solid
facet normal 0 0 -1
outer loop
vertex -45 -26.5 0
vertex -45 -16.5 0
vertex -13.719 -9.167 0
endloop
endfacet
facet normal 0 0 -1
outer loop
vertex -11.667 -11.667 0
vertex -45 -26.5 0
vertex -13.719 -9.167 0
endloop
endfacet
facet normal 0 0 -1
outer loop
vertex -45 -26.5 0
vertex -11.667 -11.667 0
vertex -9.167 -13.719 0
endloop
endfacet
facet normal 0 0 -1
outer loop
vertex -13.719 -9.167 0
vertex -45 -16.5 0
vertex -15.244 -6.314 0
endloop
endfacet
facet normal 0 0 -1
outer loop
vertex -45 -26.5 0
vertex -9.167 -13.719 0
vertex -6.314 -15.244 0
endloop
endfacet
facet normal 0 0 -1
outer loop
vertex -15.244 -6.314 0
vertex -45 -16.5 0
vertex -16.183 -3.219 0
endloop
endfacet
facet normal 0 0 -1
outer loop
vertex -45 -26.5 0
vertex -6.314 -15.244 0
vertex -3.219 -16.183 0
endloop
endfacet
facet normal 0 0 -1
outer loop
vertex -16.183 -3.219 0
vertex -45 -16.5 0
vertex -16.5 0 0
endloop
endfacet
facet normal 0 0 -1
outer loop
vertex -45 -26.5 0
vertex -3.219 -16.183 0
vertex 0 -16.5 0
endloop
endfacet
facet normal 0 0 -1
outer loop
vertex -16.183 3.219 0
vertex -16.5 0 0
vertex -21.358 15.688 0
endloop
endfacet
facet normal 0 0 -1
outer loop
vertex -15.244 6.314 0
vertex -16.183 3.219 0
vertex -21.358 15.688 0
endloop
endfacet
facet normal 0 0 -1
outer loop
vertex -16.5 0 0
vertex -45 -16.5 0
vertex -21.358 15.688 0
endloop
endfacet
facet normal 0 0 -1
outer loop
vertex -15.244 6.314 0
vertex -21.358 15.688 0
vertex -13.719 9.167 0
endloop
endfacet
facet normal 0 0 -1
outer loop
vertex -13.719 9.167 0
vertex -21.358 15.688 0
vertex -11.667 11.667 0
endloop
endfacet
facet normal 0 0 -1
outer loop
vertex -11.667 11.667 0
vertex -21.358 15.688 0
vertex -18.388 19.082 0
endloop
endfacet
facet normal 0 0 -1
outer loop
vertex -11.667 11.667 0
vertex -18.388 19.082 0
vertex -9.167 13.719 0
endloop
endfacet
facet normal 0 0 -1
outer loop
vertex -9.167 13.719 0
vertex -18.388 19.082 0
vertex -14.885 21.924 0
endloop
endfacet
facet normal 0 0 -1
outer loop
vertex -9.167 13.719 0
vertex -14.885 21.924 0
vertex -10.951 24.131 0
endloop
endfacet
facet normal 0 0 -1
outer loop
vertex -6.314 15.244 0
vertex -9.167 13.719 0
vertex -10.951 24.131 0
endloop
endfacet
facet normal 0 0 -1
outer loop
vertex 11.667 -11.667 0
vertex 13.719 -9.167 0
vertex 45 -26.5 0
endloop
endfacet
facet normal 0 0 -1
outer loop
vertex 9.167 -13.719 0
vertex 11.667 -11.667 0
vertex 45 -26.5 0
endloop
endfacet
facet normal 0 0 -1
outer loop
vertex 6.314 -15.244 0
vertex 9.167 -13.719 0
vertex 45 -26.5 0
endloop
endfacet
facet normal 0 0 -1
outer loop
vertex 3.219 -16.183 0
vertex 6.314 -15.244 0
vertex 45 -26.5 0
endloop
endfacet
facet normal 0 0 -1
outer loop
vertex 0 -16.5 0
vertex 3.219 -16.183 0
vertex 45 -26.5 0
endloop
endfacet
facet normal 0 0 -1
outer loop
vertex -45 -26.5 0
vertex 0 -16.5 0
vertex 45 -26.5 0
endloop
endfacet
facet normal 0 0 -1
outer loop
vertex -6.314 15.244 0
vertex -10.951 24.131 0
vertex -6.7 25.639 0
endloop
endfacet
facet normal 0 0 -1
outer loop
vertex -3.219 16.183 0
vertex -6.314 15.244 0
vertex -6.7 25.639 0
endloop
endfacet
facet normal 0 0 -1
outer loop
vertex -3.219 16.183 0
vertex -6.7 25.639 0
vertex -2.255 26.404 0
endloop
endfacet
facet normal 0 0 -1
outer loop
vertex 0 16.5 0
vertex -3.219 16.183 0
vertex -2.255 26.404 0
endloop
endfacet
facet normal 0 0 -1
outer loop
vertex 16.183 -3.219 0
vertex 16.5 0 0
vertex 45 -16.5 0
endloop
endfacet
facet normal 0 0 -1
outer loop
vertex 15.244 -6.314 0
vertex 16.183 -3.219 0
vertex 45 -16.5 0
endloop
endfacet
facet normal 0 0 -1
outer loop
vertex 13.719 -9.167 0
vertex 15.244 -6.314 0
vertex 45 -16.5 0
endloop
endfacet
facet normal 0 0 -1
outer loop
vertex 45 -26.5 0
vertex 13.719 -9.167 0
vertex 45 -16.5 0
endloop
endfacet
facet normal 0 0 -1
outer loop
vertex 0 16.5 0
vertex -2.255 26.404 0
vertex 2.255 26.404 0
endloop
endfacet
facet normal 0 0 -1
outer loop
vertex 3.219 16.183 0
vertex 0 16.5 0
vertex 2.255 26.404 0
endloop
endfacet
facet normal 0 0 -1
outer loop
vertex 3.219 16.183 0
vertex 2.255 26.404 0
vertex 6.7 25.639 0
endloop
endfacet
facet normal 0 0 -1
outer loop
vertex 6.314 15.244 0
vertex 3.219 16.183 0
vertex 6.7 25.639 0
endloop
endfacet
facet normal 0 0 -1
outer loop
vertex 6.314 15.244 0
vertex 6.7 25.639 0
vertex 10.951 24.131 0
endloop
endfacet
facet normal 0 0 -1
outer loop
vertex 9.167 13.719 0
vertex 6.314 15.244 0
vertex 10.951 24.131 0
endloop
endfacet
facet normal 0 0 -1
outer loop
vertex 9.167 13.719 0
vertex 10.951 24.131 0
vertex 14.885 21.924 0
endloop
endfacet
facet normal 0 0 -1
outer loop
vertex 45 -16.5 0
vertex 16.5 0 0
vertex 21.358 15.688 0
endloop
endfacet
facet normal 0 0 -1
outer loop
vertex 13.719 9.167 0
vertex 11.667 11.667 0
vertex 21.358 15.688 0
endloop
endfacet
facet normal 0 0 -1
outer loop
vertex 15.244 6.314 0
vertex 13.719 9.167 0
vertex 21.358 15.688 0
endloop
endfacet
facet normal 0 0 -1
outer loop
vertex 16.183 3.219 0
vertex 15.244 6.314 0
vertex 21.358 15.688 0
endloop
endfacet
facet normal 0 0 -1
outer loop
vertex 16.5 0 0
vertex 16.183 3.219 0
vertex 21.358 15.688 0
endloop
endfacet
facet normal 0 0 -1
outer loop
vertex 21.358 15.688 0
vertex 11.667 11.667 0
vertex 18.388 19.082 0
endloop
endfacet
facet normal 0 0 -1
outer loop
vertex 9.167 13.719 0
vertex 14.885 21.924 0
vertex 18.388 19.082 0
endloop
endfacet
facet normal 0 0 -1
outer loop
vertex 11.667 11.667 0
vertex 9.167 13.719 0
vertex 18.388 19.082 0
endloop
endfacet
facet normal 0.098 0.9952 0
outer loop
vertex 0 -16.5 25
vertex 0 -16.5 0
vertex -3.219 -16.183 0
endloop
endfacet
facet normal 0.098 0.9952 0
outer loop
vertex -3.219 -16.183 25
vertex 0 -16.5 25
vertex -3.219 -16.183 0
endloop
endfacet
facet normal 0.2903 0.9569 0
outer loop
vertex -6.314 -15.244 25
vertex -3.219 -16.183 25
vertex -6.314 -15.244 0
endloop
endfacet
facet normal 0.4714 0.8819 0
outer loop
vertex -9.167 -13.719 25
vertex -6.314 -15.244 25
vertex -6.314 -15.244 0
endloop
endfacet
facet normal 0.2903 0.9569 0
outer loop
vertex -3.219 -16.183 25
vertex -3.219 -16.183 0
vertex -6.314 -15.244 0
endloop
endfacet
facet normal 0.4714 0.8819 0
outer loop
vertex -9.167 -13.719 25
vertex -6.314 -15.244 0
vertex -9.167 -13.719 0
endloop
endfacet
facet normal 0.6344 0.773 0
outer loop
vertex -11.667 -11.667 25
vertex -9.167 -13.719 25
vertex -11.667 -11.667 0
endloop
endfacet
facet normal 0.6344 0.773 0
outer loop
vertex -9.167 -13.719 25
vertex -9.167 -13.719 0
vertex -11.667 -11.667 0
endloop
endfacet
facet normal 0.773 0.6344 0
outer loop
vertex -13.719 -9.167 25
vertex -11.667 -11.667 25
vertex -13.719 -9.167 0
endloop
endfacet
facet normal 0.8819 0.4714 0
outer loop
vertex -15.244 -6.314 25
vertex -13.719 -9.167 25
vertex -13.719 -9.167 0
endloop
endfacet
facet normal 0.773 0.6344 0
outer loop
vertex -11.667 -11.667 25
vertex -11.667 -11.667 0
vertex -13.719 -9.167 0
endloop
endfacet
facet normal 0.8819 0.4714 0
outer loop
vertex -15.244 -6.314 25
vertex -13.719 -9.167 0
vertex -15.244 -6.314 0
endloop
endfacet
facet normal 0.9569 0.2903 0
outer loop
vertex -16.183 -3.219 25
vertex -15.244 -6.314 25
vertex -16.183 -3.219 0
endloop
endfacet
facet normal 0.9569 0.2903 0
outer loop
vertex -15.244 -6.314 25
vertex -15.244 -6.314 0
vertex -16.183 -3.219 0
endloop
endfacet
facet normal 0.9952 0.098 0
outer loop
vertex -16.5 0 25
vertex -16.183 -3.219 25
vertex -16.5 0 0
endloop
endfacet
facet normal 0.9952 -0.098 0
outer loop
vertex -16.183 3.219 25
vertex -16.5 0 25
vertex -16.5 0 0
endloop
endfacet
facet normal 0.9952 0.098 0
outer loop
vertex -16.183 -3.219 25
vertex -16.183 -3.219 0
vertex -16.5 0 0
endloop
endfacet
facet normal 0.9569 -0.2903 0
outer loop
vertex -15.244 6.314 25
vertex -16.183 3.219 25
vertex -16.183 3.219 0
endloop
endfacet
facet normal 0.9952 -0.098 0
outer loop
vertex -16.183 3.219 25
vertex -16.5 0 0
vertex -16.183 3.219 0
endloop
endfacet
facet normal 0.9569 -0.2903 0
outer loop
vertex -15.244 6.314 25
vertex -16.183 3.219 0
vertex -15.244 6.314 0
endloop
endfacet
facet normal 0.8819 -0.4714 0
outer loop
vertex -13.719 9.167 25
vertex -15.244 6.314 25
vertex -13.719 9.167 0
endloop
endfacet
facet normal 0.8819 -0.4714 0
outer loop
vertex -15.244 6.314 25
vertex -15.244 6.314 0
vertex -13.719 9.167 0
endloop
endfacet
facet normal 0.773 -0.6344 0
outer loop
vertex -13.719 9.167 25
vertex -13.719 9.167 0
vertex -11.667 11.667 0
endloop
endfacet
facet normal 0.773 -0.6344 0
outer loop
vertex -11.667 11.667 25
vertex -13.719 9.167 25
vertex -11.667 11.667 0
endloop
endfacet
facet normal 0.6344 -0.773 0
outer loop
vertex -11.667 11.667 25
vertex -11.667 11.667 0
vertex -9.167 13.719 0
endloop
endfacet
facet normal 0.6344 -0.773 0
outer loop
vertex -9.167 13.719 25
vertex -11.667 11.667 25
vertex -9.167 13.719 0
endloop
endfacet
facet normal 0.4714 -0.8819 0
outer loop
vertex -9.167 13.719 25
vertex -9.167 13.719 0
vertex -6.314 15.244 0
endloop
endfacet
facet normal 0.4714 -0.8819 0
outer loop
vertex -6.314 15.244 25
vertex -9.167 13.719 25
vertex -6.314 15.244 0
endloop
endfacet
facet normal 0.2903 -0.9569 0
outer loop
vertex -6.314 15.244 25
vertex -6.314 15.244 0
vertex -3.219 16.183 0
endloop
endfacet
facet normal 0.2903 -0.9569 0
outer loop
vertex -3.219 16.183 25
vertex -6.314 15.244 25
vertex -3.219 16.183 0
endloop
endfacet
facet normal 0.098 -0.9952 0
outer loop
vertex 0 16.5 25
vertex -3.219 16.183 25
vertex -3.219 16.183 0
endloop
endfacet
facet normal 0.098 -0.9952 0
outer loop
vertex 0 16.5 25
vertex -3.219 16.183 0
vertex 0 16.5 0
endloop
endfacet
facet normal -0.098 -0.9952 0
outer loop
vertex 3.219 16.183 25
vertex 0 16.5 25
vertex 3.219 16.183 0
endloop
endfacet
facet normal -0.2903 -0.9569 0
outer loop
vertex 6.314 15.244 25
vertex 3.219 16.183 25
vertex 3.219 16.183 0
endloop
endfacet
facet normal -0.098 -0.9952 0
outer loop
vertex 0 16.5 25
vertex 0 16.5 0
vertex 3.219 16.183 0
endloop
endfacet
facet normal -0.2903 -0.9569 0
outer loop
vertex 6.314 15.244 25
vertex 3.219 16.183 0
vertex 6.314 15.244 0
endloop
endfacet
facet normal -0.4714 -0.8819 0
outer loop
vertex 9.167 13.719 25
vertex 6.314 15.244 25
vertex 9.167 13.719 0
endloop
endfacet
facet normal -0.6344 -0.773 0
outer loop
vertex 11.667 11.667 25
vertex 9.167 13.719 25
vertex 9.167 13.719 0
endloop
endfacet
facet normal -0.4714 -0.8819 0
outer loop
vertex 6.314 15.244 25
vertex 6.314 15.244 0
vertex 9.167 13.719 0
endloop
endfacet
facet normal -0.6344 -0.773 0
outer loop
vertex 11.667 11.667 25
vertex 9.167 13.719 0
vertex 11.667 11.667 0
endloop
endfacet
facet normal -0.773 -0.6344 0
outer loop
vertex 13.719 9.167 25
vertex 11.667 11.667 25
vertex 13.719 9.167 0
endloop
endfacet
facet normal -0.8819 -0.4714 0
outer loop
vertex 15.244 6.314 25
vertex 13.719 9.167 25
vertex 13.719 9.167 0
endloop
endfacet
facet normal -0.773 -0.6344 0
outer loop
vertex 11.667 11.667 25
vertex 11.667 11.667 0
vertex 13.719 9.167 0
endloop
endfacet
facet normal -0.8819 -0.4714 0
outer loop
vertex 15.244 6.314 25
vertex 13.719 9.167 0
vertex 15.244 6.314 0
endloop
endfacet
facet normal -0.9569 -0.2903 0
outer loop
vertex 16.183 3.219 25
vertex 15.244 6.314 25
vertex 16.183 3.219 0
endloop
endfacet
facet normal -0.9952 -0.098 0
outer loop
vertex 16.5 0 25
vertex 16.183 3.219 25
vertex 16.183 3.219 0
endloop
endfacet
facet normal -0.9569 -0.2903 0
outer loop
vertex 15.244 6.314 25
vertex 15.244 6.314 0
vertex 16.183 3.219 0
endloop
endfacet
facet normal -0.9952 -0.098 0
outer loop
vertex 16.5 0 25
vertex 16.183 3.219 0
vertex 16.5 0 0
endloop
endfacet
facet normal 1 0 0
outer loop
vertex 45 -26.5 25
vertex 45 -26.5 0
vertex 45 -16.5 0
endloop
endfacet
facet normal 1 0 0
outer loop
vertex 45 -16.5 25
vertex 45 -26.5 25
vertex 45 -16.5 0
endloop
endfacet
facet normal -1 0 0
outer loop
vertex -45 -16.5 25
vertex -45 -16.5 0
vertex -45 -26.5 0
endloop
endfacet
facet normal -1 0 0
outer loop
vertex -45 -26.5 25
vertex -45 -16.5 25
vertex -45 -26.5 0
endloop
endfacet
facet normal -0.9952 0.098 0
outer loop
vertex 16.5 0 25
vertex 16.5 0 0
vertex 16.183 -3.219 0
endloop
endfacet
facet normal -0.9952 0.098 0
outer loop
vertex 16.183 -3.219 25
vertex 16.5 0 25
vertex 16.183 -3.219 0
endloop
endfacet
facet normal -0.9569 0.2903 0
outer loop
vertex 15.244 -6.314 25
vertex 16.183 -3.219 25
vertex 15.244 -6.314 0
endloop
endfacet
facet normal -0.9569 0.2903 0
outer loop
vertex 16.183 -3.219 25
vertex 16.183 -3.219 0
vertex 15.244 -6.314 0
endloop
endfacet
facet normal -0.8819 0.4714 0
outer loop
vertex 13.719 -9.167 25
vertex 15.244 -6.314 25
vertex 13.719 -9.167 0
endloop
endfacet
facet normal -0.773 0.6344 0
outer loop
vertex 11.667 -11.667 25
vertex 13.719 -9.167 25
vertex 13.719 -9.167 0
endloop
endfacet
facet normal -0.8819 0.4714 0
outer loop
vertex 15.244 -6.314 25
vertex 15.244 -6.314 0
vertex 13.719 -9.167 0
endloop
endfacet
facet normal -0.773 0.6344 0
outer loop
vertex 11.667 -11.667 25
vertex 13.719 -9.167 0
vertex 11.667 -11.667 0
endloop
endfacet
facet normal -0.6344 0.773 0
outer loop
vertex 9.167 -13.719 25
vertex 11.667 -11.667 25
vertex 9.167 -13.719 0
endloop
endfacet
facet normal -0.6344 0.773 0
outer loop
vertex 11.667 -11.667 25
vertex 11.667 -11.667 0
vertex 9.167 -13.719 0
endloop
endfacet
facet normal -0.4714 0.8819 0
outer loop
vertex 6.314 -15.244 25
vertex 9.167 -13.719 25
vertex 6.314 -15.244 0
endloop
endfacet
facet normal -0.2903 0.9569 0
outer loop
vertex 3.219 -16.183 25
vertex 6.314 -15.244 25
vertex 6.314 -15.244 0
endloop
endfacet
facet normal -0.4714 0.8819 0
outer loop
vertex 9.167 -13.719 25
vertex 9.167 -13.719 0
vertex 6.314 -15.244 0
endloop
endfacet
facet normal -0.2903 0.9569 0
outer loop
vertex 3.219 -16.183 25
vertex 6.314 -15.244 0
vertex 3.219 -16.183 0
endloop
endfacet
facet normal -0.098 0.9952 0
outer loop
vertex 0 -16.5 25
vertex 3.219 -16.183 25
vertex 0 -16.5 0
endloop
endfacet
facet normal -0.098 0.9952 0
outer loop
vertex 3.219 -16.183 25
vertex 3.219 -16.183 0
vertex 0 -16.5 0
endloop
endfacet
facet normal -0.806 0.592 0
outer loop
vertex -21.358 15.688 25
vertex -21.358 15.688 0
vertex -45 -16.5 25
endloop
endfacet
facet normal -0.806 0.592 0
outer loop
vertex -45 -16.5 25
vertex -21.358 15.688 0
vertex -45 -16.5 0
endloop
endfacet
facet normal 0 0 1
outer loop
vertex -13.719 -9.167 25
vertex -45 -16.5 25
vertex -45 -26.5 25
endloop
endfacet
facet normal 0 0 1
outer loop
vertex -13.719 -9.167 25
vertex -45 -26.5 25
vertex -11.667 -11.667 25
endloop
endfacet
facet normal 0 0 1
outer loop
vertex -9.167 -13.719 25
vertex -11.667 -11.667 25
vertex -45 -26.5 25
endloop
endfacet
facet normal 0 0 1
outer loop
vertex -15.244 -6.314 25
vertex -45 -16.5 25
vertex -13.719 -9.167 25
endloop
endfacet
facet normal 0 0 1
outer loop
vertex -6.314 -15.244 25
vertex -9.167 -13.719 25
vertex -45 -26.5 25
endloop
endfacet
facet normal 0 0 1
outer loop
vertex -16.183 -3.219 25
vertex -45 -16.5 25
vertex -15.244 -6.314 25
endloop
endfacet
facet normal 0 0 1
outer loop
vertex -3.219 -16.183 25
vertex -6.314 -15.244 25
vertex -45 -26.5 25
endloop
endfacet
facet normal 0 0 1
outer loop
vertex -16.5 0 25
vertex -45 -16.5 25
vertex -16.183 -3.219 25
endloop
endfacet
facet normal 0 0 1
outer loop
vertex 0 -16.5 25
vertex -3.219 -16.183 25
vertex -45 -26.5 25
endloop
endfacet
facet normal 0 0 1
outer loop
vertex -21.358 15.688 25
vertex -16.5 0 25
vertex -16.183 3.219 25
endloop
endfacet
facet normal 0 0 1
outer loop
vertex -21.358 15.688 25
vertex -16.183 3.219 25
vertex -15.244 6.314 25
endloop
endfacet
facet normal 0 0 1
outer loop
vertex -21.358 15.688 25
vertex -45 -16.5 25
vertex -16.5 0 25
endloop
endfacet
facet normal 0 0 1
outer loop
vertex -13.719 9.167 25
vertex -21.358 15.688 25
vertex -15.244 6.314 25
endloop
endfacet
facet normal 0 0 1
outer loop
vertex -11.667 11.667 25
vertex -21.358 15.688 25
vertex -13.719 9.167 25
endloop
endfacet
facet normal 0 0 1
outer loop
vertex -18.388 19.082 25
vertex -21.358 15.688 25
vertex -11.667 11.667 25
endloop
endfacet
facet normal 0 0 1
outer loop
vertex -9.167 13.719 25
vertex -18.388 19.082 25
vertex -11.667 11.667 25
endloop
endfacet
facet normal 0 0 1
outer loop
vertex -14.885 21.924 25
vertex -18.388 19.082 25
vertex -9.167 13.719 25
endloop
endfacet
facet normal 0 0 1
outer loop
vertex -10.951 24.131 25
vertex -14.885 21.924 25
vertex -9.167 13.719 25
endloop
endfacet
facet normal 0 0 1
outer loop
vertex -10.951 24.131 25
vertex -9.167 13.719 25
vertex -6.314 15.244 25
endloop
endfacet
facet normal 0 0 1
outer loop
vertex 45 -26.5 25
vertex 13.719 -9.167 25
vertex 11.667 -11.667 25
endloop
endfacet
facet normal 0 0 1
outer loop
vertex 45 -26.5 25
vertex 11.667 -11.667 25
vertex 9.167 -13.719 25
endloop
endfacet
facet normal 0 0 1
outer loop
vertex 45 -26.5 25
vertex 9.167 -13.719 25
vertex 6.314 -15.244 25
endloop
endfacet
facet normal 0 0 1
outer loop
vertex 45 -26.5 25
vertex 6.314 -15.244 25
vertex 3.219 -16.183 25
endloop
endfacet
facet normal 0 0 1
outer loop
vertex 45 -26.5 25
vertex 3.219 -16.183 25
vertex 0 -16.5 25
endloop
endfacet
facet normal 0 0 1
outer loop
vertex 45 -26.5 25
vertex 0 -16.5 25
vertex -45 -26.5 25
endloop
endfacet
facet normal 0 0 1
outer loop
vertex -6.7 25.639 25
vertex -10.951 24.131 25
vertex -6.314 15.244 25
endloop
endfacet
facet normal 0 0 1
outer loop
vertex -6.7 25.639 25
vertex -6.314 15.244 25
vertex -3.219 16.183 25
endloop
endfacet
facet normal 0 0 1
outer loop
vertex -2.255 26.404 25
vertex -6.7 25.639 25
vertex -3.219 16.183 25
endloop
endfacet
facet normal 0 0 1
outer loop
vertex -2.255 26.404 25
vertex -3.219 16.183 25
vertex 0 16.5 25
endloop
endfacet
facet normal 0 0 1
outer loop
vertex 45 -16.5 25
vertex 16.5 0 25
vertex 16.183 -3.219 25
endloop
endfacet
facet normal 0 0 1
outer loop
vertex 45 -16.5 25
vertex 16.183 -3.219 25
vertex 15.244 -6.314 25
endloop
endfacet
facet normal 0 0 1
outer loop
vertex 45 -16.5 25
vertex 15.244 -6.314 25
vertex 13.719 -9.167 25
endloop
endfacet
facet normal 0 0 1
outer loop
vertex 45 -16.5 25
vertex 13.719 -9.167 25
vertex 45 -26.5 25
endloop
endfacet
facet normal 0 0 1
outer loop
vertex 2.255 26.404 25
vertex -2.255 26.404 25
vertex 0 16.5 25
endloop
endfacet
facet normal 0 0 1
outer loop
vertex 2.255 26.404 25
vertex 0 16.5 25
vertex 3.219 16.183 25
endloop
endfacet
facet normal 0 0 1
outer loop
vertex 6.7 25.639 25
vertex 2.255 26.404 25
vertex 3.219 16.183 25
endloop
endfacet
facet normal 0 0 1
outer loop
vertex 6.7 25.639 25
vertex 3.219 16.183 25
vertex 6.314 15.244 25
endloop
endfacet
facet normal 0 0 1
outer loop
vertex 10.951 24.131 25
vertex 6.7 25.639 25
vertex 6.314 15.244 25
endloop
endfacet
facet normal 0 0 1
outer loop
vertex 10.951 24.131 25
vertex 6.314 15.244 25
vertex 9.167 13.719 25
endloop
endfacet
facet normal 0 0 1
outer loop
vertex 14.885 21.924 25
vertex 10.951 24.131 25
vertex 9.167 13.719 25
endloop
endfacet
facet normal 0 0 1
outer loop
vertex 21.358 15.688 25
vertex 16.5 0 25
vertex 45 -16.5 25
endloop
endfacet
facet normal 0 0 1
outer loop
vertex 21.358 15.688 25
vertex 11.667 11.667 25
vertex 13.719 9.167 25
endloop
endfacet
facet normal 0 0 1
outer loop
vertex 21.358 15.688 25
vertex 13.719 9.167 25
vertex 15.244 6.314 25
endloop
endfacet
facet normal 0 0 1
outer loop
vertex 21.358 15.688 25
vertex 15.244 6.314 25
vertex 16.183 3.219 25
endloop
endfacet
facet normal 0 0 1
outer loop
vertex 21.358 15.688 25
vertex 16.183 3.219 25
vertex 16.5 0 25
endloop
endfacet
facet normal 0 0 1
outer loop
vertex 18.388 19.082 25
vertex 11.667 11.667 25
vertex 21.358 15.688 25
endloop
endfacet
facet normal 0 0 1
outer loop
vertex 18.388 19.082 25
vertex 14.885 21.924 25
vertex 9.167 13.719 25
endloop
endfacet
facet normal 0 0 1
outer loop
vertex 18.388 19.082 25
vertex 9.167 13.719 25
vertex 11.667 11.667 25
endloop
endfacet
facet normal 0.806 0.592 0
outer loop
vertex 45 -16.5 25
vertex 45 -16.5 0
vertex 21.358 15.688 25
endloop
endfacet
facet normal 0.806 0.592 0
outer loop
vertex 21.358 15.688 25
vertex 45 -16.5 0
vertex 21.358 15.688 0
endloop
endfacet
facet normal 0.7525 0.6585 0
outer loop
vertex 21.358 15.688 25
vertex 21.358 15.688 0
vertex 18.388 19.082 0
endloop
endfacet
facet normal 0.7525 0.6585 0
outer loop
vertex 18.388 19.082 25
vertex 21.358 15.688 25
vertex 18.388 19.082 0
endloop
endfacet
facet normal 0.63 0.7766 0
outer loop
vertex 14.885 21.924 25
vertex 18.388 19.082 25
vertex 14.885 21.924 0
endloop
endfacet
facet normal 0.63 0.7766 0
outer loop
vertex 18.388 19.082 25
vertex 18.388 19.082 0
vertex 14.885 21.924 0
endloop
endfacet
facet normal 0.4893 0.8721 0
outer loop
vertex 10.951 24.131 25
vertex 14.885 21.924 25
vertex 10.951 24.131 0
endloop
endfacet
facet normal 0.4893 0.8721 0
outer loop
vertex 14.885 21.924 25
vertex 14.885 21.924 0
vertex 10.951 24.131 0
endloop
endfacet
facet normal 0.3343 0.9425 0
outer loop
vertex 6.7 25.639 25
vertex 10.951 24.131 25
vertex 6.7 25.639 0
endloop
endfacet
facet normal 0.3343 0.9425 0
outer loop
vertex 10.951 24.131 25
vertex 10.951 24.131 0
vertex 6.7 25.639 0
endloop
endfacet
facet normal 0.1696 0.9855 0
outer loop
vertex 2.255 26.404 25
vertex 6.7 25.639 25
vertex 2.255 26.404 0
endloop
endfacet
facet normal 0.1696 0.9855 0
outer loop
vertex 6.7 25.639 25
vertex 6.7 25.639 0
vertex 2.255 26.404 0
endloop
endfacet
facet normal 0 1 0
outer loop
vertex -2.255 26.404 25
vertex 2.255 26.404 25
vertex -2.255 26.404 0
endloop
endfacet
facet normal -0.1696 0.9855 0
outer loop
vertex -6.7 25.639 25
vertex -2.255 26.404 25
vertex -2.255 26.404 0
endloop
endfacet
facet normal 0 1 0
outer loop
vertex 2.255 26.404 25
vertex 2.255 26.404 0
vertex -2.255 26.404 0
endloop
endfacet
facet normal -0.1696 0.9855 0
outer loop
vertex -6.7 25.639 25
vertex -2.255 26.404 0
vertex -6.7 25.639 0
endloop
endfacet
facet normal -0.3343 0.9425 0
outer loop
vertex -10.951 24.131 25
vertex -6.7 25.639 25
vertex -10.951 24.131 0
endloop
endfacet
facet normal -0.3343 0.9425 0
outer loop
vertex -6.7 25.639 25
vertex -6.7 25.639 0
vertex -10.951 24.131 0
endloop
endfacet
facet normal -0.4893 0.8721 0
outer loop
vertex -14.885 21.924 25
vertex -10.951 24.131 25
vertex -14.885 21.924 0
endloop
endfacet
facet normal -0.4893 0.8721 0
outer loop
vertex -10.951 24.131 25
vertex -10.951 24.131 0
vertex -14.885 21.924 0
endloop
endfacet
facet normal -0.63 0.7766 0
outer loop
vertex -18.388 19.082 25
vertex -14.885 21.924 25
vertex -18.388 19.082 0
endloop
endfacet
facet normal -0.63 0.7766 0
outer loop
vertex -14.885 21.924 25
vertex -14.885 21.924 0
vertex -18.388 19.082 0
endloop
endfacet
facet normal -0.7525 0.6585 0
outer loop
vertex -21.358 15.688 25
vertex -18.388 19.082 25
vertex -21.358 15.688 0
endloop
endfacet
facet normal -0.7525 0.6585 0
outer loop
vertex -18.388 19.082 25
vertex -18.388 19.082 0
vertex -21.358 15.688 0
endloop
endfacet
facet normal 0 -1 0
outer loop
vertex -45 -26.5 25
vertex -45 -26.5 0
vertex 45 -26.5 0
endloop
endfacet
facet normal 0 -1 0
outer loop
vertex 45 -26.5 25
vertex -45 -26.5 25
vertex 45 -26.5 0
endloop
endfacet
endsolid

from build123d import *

# Parameters (mm, degrees)
F1_DEPTH = 25


with BuildPart() as f1:
    # F0 (on Top) → F1 (new body)
    with BuildSketch(Plane.XY):
        with BuildLine():
            Line((-20.7364413533, -16.5), (0, -16.5))
            Line((0, -16.5), (20.7364413533, -16.5))
            ThreePointArc((20.7364413533, -16.5), (25.0176507277, -8.7388301316), (26.5, 0))
            ThreePointArc((26.5, 0), (25.181622021, 8.2544480367), (21.3576669894, 15.6875766379))
            ThreePointArc((21.3576669894, 15.6875766379), (0, 26.5), (-21.3576669894, 15.6875766379))
            ThreePointArc((-21.3576669894, 15.6875766379), (-26.4950658, -0.5113592207), (-20.7364413533, -16.5))
        make_face()
        with BuildLine():
            ThreePointArc((0, -16.5), (-11.6672618896, 11.6672618896), (16.5, 0))
            ThreePointArc((16.5, 0), (11.6672618896, -11.6672618896), (0, -16.5))
        make_face(mode=Mode.SUBTRACT)
        with BuildLine():
            Line((20.7364413533, -16.5), (0, -16.5))
            Line((0, -16.5), (0, -26.5))
            ThreePointArc((0, -26.5), (11.5108644332, -23.8694365246), (20.7364413533, -16.5))
        make_face()
        with BuildLine():
            Line((0, -26.5), (0, -16.5))
            Line((0, -16.5), (-20.7364413533, -16.5))
            ThreePointArc((-20.7364413533, -16.5), (-11.5108644332, -23.8694365246), (0, -26.5))
        make_face()
        with BuildLine():
            Line((45, -16.5), (20.7364413533, -16.5))
            ThreePointArc((20.7364413533, -16.5), (11.5108644332, -23.8694365246), (0, -26.5))
            Line((0, -26.5), (45, -26.5))
            Line((45, -26.5), (45, -16.5))
        make_face()
        with BuildLine():
            ThreePointArc((26.5, 0), (25.0176507277, -8.7388301316), (20.7364413533, -16.5))
            Line((20.7364413533, -16.5), (45, -16.5))
            Line((45, -16.5), (21.3576669894, 15.6875766379))
            ThreePointArc((21.3576669894, 15.6875766379), (25.181622021, 8.2544480367), (26.5, 0))
        make_face()
        with BuildLine():
            Line((-45, -26.5), (0, -26.5))
            ThreePointArc((0, -26.5), (-11.5108644332, -23.8694365246), (-20.7364413533, -16.5))
            Line((-20.7364413533, -16.5), (-45, -16.5))
            Line((-45, -16.5), (-45, -26.5))
        make_face()
        with BuildLine():
            Line((-45, -16.5), (-20.7364413533, -16.5))
            ThreePointArc((-20.7364413533, -16.5), (-26.4950658, -0.5113592207), (-21.3576669894, 15.6875766379))
            Line((-21.3576669894, 15.6875766379), (-45, -16.5))
        make_face()
    extrude(amount=F1_DEPTH)


solid = f1.part
